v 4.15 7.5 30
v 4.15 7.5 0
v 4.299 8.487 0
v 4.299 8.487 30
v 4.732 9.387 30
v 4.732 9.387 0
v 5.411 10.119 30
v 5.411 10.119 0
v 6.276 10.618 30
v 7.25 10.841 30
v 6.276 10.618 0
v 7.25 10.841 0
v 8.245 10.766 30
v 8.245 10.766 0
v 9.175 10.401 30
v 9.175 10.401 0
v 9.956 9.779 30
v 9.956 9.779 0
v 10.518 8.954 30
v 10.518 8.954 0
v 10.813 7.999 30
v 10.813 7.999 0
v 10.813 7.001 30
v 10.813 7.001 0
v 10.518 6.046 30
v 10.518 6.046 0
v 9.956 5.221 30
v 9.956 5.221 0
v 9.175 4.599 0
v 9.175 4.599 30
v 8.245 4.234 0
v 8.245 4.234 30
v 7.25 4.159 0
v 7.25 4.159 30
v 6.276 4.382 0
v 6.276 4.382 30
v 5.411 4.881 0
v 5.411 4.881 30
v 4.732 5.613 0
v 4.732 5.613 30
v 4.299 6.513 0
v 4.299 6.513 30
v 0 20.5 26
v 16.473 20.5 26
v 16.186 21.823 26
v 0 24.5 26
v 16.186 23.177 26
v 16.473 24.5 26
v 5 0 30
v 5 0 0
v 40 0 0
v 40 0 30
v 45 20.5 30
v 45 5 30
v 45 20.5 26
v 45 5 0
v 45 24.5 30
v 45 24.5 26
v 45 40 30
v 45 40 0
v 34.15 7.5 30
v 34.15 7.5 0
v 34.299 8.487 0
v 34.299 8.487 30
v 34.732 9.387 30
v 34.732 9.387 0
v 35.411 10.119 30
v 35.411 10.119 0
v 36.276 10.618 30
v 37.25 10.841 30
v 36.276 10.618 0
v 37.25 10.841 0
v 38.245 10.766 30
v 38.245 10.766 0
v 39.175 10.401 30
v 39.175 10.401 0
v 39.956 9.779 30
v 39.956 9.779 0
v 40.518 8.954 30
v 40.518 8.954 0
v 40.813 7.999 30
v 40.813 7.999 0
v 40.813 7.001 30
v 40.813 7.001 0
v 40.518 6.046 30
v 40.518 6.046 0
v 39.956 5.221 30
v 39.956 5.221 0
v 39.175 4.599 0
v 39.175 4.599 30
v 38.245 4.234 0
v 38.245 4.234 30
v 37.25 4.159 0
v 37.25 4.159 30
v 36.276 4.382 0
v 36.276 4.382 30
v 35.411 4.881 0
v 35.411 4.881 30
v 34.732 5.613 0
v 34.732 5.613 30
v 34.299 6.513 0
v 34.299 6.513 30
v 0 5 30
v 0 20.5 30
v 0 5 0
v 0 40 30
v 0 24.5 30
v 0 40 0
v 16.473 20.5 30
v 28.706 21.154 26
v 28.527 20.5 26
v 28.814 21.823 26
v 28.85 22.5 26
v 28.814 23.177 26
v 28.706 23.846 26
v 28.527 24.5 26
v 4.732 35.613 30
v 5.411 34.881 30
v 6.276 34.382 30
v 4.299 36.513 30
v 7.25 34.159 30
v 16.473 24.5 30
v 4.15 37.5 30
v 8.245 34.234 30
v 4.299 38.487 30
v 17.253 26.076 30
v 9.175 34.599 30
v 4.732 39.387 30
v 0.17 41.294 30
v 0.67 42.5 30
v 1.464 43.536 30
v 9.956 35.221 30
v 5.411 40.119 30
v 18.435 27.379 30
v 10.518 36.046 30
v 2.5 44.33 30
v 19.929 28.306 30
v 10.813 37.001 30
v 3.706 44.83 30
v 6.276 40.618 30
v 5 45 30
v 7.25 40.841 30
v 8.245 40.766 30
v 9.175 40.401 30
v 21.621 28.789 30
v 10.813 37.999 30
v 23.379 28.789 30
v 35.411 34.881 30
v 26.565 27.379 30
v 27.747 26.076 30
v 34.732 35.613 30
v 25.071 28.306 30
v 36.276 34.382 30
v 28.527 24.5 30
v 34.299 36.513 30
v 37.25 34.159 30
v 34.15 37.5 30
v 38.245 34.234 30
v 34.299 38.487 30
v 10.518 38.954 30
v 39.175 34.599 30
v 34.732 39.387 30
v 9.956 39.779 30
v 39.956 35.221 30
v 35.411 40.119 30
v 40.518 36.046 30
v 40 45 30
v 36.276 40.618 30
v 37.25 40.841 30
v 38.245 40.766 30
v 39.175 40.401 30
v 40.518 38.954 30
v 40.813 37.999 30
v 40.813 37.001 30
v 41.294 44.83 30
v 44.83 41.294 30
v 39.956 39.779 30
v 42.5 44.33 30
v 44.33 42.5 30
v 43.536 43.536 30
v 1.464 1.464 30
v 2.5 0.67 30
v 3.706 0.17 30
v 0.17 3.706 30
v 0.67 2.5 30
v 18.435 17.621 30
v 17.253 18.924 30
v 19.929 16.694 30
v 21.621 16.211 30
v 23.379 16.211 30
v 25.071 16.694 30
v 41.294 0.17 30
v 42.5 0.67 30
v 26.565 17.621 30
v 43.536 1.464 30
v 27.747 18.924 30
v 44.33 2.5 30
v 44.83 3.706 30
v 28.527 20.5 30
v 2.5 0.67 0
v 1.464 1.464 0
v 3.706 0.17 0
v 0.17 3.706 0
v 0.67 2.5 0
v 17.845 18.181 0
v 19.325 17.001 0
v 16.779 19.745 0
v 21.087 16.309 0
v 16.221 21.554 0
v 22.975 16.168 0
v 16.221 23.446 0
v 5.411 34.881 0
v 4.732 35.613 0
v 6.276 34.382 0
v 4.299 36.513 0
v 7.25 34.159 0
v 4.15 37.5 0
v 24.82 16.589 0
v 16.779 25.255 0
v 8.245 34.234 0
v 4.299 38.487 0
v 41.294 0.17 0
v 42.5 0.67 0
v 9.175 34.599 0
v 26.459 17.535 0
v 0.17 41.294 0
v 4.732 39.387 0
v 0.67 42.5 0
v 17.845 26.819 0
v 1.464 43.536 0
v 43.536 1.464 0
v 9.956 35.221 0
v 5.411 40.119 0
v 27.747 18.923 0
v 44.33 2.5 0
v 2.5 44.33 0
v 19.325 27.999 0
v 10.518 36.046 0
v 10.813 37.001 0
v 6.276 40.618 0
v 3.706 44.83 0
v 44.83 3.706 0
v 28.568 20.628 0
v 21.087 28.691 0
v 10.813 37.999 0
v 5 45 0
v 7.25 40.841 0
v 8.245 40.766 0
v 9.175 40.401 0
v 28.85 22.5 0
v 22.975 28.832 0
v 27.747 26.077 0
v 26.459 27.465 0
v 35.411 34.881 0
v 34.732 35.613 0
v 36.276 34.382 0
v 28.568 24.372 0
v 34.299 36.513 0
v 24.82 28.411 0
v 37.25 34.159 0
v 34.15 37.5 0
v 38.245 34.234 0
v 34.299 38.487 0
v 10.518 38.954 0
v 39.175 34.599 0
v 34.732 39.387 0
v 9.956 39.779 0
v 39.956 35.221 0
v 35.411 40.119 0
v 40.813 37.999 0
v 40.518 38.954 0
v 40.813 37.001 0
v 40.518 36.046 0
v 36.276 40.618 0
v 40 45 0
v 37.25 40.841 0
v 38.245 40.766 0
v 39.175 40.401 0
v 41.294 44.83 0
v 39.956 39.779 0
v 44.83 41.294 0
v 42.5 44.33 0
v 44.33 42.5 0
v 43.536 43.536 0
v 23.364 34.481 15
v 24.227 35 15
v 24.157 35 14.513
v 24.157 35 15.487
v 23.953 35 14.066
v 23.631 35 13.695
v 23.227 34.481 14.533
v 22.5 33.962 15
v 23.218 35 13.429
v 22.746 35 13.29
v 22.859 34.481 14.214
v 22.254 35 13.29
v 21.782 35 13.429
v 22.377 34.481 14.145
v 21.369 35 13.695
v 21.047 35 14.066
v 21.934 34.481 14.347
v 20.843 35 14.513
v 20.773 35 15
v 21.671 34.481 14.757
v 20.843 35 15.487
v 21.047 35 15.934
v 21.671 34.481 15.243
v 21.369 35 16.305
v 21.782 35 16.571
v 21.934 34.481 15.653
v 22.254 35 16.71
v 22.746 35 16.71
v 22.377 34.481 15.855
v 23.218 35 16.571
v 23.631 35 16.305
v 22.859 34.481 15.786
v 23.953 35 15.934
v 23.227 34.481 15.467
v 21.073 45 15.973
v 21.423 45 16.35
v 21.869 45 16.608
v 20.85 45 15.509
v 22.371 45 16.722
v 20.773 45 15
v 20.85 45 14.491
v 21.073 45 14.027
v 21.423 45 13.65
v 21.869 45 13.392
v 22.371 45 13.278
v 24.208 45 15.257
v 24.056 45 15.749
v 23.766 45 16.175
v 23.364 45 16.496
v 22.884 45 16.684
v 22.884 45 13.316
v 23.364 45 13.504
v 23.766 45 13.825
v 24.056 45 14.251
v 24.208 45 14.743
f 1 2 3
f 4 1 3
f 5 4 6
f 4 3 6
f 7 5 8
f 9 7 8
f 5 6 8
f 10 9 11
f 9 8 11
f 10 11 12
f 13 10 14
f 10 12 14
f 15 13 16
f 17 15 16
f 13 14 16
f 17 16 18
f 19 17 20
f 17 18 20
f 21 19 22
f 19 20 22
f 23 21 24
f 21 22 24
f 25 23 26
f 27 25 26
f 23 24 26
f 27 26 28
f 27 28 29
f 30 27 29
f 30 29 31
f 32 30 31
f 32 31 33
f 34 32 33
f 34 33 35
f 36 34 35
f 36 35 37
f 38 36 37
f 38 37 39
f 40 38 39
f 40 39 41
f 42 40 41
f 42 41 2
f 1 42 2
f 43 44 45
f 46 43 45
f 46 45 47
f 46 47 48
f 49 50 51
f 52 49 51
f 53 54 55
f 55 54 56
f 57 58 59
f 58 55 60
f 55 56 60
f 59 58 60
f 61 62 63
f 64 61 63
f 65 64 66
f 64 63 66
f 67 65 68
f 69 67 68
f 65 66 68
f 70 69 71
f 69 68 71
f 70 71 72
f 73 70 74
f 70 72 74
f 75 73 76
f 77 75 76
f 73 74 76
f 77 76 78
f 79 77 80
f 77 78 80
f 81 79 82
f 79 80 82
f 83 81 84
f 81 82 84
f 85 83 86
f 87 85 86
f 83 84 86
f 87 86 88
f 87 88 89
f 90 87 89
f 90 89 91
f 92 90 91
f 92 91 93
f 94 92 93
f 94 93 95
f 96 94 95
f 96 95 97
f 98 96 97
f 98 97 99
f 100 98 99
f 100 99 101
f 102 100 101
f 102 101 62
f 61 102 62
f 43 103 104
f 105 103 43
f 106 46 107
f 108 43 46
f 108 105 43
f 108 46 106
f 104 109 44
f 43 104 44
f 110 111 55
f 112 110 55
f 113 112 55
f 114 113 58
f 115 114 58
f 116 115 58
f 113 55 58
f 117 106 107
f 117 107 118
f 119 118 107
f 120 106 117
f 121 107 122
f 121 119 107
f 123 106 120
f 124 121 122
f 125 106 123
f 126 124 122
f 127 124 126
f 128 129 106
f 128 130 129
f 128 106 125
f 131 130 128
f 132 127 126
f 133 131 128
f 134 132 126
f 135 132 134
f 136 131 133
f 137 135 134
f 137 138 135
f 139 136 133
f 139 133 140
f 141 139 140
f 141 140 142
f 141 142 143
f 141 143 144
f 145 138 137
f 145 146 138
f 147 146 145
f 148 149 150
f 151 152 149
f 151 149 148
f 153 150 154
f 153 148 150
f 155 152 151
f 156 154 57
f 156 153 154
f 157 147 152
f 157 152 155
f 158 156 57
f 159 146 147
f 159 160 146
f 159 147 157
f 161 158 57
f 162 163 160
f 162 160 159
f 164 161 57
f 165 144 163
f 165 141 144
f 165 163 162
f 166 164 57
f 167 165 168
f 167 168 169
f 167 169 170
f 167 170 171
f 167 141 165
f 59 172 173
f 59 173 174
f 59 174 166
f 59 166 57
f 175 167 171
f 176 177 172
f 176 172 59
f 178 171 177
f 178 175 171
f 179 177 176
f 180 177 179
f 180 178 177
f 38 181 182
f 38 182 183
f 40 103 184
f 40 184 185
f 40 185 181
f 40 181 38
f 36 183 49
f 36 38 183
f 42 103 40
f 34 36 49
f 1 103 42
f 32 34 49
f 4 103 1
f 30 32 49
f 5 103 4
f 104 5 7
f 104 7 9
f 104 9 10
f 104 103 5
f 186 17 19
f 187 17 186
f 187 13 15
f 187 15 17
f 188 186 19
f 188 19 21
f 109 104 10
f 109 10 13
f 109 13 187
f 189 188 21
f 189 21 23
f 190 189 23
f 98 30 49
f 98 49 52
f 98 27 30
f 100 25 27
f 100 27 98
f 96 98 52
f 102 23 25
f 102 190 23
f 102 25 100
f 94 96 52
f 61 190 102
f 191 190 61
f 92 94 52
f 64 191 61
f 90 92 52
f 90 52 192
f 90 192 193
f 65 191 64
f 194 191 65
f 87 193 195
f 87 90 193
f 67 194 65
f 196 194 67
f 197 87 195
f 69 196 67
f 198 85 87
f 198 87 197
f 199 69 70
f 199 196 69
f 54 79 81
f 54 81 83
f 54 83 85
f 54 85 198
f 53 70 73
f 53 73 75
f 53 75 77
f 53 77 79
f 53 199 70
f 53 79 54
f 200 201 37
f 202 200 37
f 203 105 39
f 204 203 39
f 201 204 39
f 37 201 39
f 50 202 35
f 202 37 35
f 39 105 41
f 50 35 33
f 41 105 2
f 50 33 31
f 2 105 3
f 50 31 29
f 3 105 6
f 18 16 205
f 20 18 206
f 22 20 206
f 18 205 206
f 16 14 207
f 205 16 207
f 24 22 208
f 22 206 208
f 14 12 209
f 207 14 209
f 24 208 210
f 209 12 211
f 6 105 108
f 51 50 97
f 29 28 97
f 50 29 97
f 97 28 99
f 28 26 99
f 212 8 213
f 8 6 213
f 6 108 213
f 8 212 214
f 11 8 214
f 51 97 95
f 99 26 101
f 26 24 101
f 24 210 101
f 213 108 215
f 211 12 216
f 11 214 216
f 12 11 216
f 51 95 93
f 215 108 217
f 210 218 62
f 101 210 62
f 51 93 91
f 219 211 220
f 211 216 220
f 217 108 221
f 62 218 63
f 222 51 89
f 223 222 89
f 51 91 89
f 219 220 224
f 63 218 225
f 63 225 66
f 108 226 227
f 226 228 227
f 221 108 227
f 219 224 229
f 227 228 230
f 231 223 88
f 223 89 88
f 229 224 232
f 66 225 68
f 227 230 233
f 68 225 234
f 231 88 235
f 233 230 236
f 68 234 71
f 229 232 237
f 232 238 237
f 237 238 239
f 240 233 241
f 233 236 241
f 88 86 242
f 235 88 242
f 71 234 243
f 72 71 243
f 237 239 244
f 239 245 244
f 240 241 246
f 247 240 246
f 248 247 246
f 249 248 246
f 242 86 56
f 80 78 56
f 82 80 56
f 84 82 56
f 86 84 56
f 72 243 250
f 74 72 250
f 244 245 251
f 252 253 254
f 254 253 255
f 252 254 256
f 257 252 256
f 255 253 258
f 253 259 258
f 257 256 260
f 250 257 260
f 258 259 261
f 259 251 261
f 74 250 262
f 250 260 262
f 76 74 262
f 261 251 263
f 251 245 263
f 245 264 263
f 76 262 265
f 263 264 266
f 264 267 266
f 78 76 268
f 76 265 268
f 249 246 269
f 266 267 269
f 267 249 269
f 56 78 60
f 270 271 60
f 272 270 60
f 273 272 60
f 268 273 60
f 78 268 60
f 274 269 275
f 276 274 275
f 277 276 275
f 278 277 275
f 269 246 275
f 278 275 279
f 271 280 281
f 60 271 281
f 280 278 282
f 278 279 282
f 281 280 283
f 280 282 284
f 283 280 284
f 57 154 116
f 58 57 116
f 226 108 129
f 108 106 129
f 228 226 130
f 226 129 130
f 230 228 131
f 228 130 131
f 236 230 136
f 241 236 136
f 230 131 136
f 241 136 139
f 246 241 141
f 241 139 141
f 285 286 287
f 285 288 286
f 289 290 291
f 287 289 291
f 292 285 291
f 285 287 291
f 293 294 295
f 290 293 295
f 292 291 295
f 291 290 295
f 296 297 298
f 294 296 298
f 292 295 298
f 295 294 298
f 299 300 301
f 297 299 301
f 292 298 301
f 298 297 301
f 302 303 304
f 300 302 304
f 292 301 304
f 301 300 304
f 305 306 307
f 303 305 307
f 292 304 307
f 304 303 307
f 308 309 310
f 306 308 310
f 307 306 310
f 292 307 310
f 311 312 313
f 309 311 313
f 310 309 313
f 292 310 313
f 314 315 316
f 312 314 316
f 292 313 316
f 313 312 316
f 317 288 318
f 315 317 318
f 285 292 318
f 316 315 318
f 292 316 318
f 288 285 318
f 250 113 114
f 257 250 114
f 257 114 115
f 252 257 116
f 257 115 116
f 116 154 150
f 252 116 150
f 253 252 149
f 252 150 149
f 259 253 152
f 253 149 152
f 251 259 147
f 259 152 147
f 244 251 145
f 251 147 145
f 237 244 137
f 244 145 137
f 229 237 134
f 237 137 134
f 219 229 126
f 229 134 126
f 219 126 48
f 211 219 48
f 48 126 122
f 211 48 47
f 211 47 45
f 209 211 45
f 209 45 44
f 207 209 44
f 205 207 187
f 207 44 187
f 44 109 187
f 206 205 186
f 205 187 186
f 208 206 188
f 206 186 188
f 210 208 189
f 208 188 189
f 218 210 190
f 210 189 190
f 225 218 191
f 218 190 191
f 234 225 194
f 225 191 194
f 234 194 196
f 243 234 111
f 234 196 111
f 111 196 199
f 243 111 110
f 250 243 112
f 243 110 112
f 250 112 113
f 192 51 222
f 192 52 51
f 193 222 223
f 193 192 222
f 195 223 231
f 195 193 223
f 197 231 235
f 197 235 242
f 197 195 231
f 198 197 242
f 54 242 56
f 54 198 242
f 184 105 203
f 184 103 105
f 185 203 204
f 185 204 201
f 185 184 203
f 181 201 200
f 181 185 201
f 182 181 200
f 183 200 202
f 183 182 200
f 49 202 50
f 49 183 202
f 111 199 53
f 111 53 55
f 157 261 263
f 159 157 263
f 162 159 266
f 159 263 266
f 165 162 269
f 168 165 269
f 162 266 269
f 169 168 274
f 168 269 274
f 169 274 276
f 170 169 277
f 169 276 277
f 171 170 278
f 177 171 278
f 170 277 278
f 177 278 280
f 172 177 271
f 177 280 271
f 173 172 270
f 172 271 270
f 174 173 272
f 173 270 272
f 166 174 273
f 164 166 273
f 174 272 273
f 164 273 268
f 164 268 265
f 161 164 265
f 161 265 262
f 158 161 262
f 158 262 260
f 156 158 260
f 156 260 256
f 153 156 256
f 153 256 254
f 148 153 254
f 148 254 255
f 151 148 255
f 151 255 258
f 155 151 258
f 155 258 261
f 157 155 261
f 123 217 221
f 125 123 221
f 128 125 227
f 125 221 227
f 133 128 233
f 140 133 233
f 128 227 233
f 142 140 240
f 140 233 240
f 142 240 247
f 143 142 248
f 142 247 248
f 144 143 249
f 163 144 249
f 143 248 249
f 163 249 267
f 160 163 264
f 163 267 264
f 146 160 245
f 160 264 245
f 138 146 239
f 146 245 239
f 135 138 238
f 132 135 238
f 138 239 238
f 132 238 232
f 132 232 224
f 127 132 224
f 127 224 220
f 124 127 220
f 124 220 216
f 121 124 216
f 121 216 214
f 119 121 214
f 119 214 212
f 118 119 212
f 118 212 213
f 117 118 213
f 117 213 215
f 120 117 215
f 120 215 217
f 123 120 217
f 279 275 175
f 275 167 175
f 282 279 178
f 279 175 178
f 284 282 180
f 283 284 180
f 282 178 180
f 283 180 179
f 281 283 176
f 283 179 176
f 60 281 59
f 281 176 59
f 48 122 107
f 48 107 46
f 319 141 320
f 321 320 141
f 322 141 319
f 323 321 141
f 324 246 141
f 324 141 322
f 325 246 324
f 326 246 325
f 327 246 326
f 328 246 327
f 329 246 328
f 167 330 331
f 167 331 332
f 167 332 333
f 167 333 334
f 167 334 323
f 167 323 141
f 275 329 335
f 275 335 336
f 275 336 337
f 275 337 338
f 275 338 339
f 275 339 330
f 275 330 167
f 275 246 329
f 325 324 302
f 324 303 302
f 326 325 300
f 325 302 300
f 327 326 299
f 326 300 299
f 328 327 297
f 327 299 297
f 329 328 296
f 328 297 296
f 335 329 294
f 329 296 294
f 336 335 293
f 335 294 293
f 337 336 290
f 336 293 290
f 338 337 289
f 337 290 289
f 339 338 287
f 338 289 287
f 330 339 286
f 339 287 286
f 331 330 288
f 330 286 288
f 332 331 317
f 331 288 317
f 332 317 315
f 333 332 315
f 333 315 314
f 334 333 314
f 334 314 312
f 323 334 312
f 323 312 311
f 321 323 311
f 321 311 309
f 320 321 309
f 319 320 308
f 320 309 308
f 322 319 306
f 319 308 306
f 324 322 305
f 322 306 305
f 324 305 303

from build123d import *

# Parameters (mm, degrees)
SKETCH1_W                  = 45
SKETCH1_H                  = 45
BOSS_EXTRUDE1_DEPTH        = 30
SKETCH2_R                  = 3.35
CUT_EXTRUDE1_DEPTH         = 31
SKETCH3_W                  = 4
SKETCH3_H                  = 4
PIEZOWIREFEEDTHROUGH_DEPTH = 46
ALIGNMENTHOLE_D            = 3.4544
ALIGNMENTHOLE_DEPTH        = 10
ALIGNMENTHOLE_TIP          = 1.037806461
F_0_535_40_TAPPED_HOLE1_D  = 12.7
FILLET1_R                  = 5


with BuildPart() as part:
    # Sketch1 → Boss-Extrude1 (new body)
    with BuildSketch(Plane.XY):
        with Locations((22.5, 22.5)):
            Rectangle(SKETCH1_W, SKETCH1_H)
    extrude(amount=BOSS_EXTRUDE1_DEPTH)

    # Sketch2 → Cut-Extrude1 (cut, through all)
    with BuildSketch(Plane(origin=(0, 0, 0), x_dir=(-1, 0, 0), z_dir=(0, 0, -1))):
        with Locations((-37.5, 37.5)):
            Circle(SKETCH2_R)
        with Locations((-7.5, 37.5)):
            Circle(SKETCH2_R)
        with Locations((-37.5, 7.5)):
            Circle(SKETCH2_R)
        with Locations((-7.5, 7.5)):
            Circle(SKETCH2_R)
    extrude(amount=-CUT_EXTRUDE1_DEPTH, mode=Mode.SUBTRACT)

    # Sketch3 → PiezoWireFeedthrough (cut, through all)
    with BuildSketch(Plane(origin=(45, 0, 0), x_dir=(0, 0, -1), z_dir=(1, 0, 0))):
        with Locations((-28, 22.5)):
            Rectangle(SKETCH3_W, SKETCH3_H)
    extrude(amount=-PIEZOWIREFEEDTHROUGH_DEPTH, mode=Mode.SUBTRACT)

    # AlignmentHole
    with Locations(Plane(origin=(0, 45, 0), x_dir=(1, 0, 0), z_dir=(0, 1, 0))):
        with Locations((22.5, -15)):
            Hole(ALIGNMENTHOLE_D / 2, depth=ALIGNMENTHOLE_DEPTH)
            with Locations((0, 0, -(ALIGNMENTHOLE_DEPTH + ALIGNMENTHOLE_TIP / 2))):  # 118° drill point
                Cone(0, ALIGNMENTHOLE_D / 2, ALIGNMENTHOLE_TIP, mode=Mode.SUBTRACT)

    # 0.535-40 Tapped Hole1 (through all)
    with Locations(Plane(origin=(0, 0, 0), x_dir=(-1, 0, 0), z_dir=(0, 0, -1))):
        with Locations((-22.5, 22.5)):
            Hole(F_0_535_40_TAPPED_HOLE1_D / 2)

    # Fillet1
    fillet1_edges = [part.edges().sort_by_distance(p)[0] for p in [
        (0, 45, 15),
        (45, 45, 15),
        (45, 0, 15),
        (0, 0, 15),
    ]]
    fillet(fillet1_edges, radius=FILLET1_R)


solid = part.part
